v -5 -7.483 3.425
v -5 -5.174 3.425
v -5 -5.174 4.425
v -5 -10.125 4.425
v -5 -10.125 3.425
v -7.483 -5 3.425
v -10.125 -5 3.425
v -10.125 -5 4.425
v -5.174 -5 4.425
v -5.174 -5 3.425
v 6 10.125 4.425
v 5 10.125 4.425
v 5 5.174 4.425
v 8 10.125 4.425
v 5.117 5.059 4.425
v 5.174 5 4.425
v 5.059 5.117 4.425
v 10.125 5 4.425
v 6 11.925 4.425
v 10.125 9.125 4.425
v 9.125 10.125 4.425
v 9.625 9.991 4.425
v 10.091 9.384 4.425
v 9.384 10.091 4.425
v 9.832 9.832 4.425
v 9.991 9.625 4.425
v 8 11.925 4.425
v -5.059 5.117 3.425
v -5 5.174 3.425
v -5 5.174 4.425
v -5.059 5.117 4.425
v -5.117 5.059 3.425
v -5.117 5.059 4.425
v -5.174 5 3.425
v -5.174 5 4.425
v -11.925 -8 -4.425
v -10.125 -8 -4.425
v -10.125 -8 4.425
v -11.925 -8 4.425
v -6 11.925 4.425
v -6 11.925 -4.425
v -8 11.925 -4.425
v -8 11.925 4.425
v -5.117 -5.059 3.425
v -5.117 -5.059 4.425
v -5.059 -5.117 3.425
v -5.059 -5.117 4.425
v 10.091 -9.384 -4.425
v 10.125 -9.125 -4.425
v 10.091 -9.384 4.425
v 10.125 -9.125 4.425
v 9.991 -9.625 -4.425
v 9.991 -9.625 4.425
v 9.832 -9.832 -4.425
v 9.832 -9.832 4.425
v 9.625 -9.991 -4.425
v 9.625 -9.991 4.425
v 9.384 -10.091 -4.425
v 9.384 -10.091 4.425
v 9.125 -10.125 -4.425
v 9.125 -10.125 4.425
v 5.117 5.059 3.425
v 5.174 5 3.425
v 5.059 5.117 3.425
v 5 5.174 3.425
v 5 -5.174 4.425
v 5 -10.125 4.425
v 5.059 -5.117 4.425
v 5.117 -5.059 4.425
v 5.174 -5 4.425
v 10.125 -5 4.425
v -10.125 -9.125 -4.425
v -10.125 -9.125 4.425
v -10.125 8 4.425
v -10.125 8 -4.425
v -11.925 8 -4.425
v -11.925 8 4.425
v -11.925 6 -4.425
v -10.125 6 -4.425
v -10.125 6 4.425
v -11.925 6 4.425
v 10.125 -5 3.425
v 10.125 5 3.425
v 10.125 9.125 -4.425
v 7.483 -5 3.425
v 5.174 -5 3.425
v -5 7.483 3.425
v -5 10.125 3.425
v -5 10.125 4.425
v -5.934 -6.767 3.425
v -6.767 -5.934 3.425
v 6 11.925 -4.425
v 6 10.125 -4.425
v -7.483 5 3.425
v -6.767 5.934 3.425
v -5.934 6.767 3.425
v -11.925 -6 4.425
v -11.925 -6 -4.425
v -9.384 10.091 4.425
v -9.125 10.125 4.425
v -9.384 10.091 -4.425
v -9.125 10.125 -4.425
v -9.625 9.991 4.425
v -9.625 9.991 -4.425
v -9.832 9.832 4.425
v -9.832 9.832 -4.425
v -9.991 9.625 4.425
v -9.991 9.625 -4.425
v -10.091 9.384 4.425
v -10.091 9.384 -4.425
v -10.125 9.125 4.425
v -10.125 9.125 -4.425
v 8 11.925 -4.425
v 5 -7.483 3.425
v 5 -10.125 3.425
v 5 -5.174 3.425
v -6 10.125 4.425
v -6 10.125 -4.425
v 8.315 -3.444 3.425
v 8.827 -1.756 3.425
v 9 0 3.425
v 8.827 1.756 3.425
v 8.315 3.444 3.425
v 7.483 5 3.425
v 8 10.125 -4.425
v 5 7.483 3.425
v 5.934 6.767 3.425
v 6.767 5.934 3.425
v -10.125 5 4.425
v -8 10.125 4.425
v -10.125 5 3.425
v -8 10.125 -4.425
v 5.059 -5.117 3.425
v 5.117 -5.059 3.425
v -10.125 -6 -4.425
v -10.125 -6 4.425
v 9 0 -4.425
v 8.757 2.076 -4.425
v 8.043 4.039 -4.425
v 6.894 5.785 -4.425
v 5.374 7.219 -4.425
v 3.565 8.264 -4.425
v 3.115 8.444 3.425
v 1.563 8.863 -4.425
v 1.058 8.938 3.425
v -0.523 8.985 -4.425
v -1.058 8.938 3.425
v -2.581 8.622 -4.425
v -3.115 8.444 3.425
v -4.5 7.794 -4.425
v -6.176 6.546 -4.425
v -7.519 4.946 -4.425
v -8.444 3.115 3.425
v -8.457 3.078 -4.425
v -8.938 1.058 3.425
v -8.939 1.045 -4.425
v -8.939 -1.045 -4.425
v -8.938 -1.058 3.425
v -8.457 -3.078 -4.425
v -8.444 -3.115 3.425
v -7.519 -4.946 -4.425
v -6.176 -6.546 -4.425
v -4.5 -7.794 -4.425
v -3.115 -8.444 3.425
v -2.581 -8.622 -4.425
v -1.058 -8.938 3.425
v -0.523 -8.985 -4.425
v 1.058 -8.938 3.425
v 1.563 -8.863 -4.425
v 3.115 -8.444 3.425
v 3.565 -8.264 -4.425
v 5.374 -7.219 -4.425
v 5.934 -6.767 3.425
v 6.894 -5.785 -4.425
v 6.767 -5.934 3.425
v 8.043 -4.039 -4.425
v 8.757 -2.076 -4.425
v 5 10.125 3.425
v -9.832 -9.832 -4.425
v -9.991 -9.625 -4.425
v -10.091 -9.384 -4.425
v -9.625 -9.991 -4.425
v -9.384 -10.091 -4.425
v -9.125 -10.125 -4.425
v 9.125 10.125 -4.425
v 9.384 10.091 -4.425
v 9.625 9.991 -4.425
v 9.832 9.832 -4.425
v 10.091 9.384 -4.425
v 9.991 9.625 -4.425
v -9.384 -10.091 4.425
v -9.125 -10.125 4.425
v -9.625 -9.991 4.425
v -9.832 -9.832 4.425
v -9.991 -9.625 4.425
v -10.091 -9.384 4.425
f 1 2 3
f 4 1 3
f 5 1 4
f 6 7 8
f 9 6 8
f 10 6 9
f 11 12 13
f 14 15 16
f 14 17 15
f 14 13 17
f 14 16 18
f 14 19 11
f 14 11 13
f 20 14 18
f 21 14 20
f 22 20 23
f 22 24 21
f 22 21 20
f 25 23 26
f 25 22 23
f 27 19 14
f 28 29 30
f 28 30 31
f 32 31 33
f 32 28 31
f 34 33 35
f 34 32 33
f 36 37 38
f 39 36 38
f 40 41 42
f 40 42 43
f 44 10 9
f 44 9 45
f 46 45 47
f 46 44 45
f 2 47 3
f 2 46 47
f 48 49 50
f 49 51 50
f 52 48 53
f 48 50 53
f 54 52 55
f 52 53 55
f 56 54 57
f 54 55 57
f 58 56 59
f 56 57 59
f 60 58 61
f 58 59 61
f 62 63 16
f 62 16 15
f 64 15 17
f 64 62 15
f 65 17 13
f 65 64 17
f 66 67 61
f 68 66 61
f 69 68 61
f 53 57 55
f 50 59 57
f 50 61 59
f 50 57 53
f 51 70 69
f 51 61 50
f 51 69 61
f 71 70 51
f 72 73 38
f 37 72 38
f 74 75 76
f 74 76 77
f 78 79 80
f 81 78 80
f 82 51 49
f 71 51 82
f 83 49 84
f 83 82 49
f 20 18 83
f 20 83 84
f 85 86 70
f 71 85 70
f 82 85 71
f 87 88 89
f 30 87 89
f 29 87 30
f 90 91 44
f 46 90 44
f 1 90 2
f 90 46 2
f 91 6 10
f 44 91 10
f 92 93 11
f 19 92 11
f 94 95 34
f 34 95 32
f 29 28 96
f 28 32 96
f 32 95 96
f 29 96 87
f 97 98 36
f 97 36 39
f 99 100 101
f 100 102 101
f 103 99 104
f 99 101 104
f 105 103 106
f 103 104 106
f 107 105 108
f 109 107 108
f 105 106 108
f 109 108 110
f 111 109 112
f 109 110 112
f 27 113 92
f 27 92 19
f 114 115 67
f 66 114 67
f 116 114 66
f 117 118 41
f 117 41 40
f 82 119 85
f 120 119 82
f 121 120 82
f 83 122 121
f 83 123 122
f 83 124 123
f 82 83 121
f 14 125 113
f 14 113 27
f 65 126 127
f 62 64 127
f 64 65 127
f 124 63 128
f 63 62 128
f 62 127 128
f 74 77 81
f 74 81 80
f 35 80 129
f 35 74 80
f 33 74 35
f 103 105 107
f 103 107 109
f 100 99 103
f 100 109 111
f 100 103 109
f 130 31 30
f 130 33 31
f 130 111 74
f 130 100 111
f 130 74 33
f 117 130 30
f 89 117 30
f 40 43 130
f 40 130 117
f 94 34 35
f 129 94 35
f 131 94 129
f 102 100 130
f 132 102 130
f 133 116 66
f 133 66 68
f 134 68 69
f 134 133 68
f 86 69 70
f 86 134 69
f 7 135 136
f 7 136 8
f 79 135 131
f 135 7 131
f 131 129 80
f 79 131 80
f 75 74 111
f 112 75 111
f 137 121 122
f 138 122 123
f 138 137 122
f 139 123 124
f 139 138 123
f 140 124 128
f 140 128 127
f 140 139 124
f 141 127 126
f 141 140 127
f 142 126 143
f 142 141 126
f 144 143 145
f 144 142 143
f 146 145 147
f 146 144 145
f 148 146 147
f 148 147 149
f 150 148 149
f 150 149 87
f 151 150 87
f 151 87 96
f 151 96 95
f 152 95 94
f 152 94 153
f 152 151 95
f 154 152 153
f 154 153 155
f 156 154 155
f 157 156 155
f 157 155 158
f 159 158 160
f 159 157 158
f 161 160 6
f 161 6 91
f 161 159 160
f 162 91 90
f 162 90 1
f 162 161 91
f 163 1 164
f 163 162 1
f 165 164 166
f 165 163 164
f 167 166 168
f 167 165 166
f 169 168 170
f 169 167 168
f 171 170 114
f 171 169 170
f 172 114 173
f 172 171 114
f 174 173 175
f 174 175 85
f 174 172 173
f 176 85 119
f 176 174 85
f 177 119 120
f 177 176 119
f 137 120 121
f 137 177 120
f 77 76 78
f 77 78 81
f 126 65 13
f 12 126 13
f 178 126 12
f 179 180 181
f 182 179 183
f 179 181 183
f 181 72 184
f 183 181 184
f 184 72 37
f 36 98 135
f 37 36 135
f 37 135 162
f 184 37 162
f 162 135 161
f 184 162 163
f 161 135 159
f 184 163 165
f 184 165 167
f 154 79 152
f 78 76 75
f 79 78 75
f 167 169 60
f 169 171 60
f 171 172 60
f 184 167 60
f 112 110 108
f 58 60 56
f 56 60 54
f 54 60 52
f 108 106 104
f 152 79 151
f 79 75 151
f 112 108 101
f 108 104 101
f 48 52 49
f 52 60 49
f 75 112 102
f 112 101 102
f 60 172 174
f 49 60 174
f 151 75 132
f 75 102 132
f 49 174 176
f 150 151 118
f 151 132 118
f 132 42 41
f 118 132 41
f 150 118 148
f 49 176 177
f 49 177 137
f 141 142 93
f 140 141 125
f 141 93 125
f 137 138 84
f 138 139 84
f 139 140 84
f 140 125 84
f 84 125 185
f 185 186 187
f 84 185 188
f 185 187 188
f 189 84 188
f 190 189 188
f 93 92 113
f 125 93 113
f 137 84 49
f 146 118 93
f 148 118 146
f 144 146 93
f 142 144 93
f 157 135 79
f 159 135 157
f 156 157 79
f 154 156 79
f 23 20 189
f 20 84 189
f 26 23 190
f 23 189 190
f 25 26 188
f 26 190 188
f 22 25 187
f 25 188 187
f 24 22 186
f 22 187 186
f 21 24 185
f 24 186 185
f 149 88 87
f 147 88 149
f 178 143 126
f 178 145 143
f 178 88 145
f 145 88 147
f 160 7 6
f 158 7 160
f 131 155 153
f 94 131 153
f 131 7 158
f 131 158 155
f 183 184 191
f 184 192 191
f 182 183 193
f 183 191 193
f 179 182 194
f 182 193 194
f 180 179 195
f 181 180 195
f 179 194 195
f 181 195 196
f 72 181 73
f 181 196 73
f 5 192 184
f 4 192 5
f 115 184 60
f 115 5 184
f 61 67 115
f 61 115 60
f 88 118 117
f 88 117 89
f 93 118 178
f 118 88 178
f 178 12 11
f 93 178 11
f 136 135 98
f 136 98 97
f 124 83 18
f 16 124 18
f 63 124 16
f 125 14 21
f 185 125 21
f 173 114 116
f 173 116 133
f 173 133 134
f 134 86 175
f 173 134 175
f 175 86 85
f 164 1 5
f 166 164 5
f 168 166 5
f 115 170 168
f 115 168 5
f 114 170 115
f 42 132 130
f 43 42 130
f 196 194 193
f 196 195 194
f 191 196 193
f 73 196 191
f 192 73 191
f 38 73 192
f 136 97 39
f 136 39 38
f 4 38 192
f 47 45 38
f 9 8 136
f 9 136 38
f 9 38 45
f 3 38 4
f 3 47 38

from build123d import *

# Parameters (mm, degrees)
SKETCH1_W           = 20.25
SKETCH1_H           = 20.25
SKETCH1_R           = 9
BOSS_EXTRUDE1_DEPTH = 4.425
BOSS_EXTRUDE2_START = -1
SKETCH2_R           = 9
SKETCH2_R_2         = 7.195345153
BOSS_EXTRUDE2_DEPTH = 1
CUT_EXTRUDE1_START  = -1
CUT_EXTRUDE1_DEPTH  = 1
FILLET1_R           = 1
SKETCH4_W           = 8.85
SKETCH4_H           = 2
BOSS_EXTRUDE3_DEPTH = 1.8
CIRPATTERN1_COUNT   = 2
CIRPATTERN1_ANGLE   = 90


with BuildPart() as part:
    # Sketch1 → Boss-Extrude1 (new, symmetric)
    with BuildSketch(Plane.XY):
        Rectangle(SKETCH1_W, SKETCH1_H)
        Circle(SKETCH1_R, mode=Mode.SUBTRACT)
    extrude(amount=BOSS_EXTRUDE1_DEPTH, both=True)

    # Sketch2 → Boss-Extrude2 (add)
    with BuildSketch(Plane.XY.offset(4.425).offset(BOSS_EXTRUDE2_START)):
        Circle(SKETCH2_R)
        Circle(SKETCH2_R_2, mode=Mode.SUBTRACT)
    extrude(amount=BOSS_EXTRUDE2_DEPTH)

    # Sketch3 → Cut-Extrude1 (cut)
    with BuildSketch(Plane.XY.offset(4.425).offset(CUT_EXTRUDE1_START)):
        with BuildLine():
            Line((-10.125, -5), (-5.174262446, -5))
            ThreePointArc((-5.174262446, -5), (-5.08787735, -5.08787735), (-5, -5.174262446))
            Line((-5, -5.174262446), (-5, -10.125))
            Line((-5, -10.125), (5, -10.125))
            Line((5, -10.125), (5, -5.174262446))
            ThreePointArc((5, -5.174262446), (5.08787735, -5.08787735), (5.174262446, -5))
            Line((5.174262446, -5), (10.125, -5))
            Line((10.125, -5), (10.125, 5))
            Line((10.125, 5), (5.174262446, 5))
            ThreePointArc((5.174262446, 5), (5.08787735, 5.08787735), (5, 5.174262446))
            Line((5, 5.174262446), (5, 10.125))
            Line((5, 10.125), (-5, 10.125))
            Line((-5, 10.125), (-5, 5.174262446))
            ThreePointArc((-5, 5.174262446), (-5.08787735, 5.08787735), (-5.174262446, 5))
            Line((-5.174262446, 5), (-10.125, 5))
            Line((-10.125, 5), (-10.125, -5))
        make_face()
    extrude(amount=CUT_EXTRUDE1_DEPTH, mode=Mode.SUBTRACT)

    # Fillet1
    fillet1_edges = [part.edges().sort_by_distance(p)[0] for p in [
        (-10.125, 10.125, 0),
        (10.125, 10.125, 0),
        (10.125, -10.125, 0),
        (-10.125, -10.125, 0),
    ]]
    fillet(fillet1_edges, radius=FILLET1_R)

    # Sketch4 → Boss-Extrude3 (add)
    with BuildSketch(Plane.ZY.offset(10.125)):
        with Locations((0, 7)):
            Rectangle(SKETCH4_W, SKETCH4_H)
        with Locations((0, -7)):
            Rectangle(SKETCH4_W, SKETCH4_H)
    boss_extrude3 = extrude(amount=BOSS_EXTRUDE3_DEPTH)

    # CirPattern1: Boss-Extrude3 ×2 about axis
    cirpattern1_axis = Axis((0, 0, 0), (0, 0, -1))
    for i in range(1, CIRPATTERN1_COUNT):
        add(boss_extrude3.rotate(cirpattern1_axis, i * CIRPATTERN1_ANGLE / (CIRPATTERN1_COUNT - 1)))


solid = part.part
